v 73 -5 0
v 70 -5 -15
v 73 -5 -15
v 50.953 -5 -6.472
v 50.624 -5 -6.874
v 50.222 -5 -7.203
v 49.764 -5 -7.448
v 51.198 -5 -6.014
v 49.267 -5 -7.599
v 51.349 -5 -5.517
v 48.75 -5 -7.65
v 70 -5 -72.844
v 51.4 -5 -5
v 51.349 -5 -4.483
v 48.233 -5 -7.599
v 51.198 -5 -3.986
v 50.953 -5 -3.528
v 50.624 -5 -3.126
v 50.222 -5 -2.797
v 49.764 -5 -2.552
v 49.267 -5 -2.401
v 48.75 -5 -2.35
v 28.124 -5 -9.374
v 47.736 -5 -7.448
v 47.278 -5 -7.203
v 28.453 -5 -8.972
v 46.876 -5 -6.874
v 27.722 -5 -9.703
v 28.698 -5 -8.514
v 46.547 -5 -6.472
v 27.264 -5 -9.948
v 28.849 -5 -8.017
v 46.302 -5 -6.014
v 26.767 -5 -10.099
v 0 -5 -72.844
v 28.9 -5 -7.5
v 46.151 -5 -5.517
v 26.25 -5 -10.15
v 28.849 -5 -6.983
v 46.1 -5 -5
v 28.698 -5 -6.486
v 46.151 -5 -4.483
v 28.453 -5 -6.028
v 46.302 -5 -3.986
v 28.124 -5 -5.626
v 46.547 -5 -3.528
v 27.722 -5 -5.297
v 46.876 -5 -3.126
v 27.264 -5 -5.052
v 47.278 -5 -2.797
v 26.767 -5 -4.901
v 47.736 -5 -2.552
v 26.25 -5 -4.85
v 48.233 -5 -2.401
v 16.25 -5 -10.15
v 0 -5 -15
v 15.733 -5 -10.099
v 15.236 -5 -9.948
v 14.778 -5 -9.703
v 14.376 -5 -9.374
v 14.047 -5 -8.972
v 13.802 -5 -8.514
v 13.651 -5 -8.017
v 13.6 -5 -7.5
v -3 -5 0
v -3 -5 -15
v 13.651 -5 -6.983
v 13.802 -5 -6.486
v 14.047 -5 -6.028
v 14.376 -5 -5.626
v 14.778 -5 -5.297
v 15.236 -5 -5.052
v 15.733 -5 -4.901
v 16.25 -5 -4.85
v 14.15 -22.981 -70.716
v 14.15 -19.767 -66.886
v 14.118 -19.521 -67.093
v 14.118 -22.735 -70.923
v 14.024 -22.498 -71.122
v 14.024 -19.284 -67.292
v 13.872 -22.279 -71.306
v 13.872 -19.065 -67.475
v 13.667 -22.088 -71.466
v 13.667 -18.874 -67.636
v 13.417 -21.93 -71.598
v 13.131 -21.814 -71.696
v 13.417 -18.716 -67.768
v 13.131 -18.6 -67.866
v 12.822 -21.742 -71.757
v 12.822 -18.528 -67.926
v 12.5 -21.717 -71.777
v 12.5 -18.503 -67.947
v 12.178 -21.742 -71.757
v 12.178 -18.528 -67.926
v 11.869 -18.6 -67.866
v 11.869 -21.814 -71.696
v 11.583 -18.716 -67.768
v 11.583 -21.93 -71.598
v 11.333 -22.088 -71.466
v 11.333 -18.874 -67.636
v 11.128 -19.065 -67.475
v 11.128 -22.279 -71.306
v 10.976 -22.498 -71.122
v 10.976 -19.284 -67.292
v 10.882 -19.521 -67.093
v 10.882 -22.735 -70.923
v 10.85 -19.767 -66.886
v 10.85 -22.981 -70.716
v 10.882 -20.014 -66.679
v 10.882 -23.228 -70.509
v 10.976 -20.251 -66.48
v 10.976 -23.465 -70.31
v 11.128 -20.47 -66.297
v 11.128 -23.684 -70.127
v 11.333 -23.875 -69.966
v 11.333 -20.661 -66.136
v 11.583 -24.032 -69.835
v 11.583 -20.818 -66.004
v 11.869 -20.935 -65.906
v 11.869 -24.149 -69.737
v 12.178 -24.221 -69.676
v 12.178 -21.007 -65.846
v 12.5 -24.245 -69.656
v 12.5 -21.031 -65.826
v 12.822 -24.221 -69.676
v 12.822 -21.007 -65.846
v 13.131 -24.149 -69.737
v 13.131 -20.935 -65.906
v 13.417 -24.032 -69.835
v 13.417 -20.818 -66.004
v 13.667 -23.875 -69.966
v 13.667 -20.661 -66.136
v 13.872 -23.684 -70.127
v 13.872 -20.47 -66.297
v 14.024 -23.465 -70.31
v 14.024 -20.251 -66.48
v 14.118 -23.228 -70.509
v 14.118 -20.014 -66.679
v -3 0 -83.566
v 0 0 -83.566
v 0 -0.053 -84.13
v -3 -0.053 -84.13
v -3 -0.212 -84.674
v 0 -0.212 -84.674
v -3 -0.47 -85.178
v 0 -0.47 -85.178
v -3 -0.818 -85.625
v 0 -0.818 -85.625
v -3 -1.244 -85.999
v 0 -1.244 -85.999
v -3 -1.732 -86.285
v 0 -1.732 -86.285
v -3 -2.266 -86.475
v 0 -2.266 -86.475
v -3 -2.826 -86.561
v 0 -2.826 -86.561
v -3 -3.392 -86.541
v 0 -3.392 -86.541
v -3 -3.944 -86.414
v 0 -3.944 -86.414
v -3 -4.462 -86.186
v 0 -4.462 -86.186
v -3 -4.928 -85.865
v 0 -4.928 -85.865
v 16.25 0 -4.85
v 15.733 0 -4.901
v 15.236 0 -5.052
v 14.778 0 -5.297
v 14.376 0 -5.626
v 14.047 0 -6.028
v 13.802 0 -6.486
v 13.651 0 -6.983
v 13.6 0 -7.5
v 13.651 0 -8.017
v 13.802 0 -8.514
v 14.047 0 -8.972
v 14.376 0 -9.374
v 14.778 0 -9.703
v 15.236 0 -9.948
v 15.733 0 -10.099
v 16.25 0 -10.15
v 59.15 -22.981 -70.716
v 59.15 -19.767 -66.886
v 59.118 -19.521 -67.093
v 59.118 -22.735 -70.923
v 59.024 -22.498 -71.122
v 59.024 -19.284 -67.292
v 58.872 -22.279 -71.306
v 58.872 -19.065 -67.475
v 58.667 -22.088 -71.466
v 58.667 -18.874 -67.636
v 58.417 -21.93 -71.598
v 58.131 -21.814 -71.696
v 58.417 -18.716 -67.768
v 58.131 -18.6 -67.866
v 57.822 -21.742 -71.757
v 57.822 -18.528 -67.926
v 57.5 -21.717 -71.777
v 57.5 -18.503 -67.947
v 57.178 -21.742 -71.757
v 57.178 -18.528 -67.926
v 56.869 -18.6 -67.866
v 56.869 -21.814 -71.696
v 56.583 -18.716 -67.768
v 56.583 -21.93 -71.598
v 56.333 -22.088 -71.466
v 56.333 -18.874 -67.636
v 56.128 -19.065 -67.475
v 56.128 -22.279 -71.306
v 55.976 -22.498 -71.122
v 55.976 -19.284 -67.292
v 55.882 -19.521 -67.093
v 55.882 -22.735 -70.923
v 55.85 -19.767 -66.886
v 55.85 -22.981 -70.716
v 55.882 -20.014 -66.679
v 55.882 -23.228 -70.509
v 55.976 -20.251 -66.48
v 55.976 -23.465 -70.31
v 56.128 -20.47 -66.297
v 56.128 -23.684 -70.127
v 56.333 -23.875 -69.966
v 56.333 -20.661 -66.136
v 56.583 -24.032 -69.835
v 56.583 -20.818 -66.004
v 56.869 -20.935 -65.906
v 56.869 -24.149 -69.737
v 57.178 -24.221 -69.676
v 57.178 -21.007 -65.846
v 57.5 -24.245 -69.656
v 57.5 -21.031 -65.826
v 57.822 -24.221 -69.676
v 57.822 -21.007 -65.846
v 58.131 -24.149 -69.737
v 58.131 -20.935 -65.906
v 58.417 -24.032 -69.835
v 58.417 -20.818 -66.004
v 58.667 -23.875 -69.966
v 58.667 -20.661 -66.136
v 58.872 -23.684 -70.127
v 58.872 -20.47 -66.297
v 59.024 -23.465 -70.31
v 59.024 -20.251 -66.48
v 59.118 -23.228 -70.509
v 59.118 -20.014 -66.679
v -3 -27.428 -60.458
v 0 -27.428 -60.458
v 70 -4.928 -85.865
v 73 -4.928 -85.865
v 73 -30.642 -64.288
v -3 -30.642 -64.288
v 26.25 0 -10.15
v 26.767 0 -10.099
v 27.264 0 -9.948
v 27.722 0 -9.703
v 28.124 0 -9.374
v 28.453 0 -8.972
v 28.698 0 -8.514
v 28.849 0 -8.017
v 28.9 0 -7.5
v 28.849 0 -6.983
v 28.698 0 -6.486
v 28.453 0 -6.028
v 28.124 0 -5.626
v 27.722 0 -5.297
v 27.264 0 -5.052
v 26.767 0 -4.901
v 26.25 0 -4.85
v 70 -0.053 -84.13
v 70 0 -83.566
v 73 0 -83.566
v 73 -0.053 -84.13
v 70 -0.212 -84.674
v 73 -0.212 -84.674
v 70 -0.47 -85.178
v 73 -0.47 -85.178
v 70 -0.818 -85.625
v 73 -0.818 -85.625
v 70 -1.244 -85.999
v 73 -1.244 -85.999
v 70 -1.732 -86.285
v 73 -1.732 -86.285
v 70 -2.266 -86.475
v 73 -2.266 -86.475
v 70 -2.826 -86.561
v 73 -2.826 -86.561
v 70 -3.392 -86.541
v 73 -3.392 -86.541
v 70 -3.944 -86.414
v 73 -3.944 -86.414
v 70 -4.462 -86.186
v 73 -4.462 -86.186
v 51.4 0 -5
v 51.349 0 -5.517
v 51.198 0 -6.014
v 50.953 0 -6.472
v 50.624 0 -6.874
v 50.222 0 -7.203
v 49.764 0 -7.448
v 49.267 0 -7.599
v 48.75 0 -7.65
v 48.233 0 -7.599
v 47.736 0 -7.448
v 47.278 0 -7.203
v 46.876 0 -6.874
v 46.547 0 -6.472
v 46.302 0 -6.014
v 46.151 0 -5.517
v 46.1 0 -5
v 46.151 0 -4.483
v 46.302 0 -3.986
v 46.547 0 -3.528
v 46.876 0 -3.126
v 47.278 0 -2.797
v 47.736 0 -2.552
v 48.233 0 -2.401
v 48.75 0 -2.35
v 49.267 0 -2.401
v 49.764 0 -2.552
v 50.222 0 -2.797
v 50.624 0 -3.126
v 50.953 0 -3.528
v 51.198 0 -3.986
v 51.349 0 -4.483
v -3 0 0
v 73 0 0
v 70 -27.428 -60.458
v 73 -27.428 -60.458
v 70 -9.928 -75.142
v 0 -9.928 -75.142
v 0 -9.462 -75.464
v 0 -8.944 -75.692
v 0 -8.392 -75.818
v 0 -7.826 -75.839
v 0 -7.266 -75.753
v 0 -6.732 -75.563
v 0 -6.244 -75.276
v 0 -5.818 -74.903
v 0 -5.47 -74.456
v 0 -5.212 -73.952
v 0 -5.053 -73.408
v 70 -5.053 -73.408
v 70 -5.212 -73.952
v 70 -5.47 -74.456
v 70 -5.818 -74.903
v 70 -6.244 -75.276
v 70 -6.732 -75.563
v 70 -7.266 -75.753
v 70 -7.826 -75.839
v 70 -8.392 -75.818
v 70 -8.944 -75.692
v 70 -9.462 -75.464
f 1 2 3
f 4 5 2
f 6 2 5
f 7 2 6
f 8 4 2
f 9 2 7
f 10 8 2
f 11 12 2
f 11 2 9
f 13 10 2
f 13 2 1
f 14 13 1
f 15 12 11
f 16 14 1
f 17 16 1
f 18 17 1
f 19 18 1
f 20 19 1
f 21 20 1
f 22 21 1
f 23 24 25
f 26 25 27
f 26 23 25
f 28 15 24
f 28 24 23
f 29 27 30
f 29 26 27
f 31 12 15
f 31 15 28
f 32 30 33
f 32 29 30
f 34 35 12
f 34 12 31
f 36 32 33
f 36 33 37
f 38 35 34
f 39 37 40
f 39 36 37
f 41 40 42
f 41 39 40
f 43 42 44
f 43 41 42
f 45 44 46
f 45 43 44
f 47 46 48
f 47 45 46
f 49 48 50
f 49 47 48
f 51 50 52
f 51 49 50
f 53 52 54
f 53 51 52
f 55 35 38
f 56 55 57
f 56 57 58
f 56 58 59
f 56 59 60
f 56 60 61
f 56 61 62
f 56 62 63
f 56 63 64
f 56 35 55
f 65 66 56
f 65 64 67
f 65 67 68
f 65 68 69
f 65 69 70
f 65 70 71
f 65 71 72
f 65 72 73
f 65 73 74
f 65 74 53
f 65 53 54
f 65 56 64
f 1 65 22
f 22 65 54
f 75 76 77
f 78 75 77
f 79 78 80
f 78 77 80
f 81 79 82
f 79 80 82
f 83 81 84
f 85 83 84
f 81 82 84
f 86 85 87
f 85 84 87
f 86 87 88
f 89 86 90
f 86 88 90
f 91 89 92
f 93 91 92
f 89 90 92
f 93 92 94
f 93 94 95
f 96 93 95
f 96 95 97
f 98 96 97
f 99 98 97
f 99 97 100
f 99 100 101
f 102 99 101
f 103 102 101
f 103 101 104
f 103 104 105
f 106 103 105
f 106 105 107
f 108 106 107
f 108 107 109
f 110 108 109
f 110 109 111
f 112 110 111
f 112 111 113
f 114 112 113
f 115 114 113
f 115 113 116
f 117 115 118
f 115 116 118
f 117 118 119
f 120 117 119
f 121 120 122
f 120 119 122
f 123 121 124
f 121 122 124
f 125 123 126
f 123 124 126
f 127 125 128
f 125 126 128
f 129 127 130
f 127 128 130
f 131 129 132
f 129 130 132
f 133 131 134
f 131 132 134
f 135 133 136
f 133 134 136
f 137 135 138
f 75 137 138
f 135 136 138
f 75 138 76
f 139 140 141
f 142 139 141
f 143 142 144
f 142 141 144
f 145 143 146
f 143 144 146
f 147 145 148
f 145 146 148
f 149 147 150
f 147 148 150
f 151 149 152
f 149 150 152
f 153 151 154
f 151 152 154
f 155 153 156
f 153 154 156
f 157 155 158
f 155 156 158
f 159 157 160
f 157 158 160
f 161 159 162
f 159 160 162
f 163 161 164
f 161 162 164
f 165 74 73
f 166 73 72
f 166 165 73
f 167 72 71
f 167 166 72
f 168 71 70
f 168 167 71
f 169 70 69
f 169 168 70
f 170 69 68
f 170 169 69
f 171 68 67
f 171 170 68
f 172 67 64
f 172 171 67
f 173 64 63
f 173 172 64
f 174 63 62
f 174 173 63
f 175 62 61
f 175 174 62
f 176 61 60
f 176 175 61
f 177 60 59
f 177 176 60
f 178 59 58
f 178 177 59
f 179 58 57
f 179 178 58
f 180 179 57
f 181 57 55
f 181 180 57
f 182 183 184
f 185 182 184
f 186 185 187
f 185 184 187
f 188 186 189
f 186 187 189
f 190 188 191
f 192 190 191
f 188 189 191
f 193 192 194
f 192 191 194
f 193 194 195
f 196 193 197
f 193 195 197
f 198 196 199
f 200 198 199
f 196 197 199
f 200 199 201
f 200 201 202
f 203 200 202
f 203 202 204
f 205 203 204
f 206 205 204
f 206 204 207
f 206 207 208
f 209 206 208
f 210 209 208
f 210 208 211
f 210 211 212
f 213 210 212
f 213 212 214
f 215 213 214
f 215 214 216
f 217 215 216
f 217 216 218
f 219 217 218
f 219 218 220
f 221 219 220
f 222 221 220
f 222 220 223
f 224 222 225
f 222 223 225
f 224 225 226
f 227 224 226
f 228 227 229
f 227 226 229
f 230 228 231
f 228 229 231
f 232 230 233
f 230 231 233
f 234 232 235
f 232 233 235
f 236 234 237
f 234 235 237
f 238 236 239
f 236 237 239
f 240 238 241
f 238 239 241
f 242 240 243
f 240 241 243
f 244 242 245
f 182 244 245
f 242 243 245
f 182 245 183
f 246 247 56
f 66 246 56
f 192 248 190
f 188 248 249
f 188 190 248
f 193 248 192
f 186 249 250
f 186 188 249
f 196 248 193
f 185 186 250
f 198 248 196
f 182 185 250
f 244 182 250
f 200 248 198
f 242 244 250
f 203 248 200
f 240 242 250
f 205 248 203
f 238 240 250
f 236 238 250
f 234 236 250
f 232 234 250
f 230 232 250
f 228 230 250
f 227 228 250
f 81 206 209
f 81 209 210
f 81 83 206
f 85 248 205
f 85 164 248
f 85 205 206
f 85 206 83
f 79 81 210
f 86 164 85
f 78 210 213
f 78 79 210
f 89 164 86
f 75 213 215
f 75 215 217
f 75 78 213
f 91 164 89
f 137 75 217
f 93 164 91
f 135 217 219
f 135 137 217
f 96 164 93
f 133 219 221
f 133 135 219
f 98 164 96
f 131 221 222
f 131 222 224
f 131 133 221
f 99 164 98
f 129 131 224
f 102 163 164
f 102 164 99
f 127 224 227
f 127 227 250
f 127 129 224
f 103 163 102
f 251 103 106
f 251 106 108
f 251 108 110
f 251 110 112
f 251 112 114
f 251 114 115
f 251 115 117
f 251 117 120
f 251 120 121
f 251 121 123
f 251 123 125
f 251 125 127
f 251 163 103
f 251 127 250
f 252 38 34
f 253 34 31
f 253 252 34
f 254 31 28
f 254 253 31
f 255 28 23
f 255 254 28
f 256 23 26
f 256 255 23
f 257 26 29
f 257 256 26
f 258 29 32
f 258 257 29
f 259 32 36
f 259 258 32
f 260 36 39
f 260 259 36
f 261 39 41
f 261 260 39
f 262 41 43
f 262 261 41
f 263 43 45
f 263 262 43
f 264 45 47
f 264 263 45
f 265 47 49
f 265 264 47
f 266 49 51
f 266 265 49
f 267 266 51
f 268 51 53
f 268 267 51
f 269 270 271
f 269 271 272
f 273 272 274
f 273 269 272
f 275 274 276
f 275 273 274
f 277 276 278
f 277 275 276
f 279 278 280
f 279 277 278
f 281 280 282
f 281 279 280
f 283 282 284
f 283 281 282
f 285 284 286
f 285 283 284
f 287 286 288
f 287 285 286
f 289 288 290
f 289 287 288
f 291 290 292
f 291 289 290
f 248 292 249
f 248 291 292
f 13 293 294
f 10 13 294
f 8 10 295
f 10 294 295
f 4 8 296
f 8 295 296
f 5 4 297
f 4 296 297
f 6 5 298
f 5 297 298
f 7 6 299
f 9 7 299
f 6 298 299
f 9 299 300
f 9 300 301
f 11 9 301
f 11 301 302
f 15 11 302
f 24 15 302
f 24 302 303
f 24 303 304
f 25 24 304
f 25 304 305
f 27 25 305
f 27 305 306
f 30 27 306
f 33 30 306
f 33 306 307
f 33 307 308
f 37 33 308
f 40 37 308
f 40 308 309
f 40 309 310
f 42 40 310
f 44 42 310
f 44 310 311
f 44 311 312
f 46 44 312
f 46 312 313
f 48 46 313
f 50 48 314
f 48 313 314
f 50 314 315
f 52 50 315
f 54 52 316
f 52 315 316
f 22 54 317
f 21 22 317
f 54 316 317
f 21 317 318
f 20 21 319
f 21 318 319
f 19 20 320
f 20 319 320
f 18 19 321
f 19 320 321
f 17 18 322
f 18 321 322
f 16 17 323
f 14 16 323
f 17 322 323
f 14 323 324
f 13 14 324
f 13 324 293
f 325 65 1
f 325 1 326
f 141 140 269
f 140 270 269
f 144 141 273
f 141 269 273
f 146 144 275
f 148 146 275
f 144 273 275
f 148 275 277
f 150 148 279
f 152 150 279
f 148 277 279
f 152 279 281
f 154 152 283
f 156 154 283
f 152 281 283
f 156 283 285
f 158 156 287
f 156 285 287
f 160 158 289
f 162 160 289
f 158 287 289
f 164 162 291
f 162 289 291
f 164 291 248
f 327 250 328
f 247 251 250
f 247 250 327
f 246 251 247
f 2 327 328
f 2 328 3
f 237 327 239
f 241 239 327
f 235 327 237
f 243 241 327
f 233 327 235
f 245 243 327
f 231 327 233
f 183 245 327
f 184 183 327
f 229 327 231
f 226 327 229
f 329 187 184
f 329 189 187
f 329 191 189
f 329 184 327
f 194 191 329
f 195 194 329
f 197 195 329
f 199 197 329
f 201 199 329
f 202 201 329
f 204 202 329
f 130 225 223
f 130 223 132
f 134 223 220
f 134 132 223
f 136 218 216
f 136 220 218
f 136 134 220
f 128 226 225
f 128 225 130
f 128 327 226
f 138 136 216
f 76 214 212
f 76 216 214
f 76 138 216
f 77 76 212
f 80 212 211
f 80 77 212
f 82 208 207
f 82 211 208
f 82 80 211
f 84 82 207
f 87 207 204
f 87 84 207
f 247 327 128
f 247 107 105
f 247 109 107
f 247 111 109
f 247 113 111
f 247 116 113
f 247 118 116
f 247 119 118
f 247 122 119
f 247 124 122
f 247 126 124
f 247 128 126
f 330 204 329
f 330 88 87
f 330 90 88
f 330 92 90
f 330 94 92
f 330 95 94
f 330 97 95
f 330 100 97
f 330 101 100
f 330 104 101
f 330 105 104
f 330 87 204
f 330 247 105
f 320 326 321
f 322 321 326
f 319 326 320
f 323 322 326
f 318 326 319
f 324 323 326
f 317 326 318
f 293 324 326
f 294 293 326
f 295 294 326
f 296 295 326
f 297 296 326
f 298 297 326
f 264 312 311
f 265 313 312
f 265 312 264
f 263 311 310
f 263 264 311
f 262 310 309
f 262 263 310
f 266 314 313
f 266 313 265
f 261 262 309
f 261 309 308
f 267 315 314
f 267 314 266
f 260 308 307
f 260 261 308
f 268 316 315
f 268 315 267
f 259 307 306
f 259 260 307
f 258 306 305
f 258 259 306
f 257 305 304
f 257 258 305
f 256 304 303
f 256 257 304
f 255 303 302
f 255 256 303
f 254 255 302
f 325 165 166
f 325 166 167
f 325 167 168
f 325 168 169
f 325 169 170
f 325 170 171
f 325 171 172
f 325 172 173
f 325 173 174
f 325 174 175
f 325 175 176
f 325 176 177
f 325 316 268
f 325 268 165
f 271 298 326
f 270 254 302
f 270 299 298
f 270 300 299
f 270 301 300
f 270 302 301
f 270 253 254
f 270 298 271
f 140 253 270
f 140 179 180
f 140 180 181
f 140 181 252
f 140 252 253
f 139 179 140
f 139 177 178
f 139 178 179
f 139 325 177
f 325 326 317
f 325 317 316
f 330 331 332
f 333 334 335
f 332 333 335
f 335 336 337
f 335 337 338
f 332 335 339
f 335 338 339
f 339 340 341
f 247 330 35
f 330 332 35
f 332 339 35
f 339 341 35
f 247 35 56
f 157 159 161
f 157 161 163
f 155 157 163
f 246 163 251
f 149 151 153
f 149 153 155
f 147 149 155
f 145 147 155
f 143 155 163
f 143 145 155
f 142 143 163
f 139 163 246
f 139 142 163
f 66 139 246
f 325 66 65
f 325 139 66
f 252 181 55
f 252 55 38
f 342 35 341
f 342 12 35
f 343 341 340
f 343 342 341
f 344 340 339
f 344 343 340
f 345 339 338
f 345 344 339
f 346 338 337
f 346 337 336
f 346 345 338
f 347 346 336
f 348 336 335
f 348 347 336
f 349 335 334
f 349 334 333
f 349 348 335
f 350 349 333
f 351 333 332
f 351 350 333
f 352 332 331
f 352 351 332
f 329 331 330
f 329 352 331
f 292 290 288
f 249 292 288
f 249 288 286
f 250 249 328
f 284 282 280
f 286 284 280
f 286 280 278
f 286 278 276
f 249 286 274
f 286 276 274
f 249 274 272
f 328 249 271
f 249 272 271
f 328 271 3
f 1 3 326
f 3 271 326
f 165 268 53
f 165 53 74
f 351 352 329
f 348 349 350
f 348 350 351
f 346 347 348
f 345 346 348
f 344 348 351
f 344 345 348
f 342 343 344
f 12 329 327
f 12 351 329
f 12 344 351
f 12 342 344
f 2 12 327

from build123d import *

# Parameters (mm, degrees)
EXTRUDE_1_DEPTH     = 70
SKETCH_2_R          = 1.65
CUT_EXTRUDE_1_DEPTH = 25.69615506
FILLET_1_R          = 3
SKETCH_6_R          = 2.65
CUT_EXTRUDE_4_DEPTH = 31.641777725
EXTRUDE_2_DEPTH     = 3
CUT_EXTRUDE_5_DEPTH = 31.641777725


with BuildPart() as part:
    # 草图1 → 凸台-拉伸1 (new body)
    with BuildSketch(Plane(origin=(0, 0, 0), x_dir=(0, 0, -1), z_dir=(1, 0, 0))):
        Polygon((0, 0), (90, 0), (64.288495613, -30.641777725), (60.458273397, -27.427839676), (79.277465397, -5), (0, -5), align=None)
    extrude(amount=EXTRUDE_1_DEPTH)

    # 草图2 → 切除-拉伸1 (cut, through all)
    with BuildSketch(Plane(origin=(0, -41.102410837, -48.983945779), x_dir=(1, 0, 0), z_dir=(0, 0.64278761, 0.766044443))):
        with Locations((12.5, 27.850884872)):
            Circle(SKETCH_2_R)
        with Locations((57.5, 27.850884872)):
            Circle(SKETCH_2_R)
    extrude(amount=-CUT_EXTRUDE_1_DEPTH, mode=Mode.SUBTRACT)

    # 圆角1
    fillet_1_edges = [part.edges().sort_by_distance(p)[0] for p in [
        (35, 0, -90),
        (35, -5, -79.277465397),
    ]]
    fillet(fillet_1_edges, radius=FILLET_1_R)

    # 草图6 → 切除-拉伸4 (cut, through all)
    with BuildSketch(Plane(origin=(0, 0, 0), x_dir=(1, 0, 0), z_dir=(0, 1, 0))):
        with Locations((48.75, 5)):
            Circle(SKETCH_6_R)
    extrude(amount=-CUT_EXTRUDE_4_DEPTH, mode=Mode.SUBTRACT)

    # 草图7 → 凸台-拉伸2 (add)
    with BuildSketch(Plane.ZY):
        with BuildLine():
            Line((-60.458273397, -27.427839676), (-15, -5))
            Line((-15, -5), (0, -5))
            Line((0, -5), (0, 0))
            Line((0, 0), (-83.566479238, 0))
            ThreePointArc((-83.566479238, 0), (-86.2854026, -1.732145215), (-85.864612568, -4.928362829))
            Line((-85.864612568, -4.928362829), (-64.288495613, -30.641777725))
            Line((-64.288495613, -30.641777725), (-60.458273397, -27.427839676))
        make_face()
    extrude_2 = extrude(amount=EXTRUDE_2_DEPTH)

    # 镜向1: 凸台-拉伸2 across plane
    add(extrude_2.mirror(Plane.ZY.offset(-35)))

    # 草图8 → 切除-拉伸5 (cut, through all)
    with BuildSketch(Plane(origin=(0, 0, 0), x_dir=(1, 0, 0), z_dir=(0, 1, 0))):
        with BuildLine():
            Line((16.25, 10.15), (26.25, 10.15))
            ThreePointArc((26.25, 10.15), (28.9, 7.5), (26.25, 4.85))
            Line((26.25, 4.85), (16.25, 4.85))
            ThreePointArc((16.25, 4.85), (13.6, 7.5), (16.25, 10.15))
        make_face()
    extrude(amount=-CUT_EXTRUDE_5_DEPTH, mode=Mode.SUBTRACT)


solid = part.part
